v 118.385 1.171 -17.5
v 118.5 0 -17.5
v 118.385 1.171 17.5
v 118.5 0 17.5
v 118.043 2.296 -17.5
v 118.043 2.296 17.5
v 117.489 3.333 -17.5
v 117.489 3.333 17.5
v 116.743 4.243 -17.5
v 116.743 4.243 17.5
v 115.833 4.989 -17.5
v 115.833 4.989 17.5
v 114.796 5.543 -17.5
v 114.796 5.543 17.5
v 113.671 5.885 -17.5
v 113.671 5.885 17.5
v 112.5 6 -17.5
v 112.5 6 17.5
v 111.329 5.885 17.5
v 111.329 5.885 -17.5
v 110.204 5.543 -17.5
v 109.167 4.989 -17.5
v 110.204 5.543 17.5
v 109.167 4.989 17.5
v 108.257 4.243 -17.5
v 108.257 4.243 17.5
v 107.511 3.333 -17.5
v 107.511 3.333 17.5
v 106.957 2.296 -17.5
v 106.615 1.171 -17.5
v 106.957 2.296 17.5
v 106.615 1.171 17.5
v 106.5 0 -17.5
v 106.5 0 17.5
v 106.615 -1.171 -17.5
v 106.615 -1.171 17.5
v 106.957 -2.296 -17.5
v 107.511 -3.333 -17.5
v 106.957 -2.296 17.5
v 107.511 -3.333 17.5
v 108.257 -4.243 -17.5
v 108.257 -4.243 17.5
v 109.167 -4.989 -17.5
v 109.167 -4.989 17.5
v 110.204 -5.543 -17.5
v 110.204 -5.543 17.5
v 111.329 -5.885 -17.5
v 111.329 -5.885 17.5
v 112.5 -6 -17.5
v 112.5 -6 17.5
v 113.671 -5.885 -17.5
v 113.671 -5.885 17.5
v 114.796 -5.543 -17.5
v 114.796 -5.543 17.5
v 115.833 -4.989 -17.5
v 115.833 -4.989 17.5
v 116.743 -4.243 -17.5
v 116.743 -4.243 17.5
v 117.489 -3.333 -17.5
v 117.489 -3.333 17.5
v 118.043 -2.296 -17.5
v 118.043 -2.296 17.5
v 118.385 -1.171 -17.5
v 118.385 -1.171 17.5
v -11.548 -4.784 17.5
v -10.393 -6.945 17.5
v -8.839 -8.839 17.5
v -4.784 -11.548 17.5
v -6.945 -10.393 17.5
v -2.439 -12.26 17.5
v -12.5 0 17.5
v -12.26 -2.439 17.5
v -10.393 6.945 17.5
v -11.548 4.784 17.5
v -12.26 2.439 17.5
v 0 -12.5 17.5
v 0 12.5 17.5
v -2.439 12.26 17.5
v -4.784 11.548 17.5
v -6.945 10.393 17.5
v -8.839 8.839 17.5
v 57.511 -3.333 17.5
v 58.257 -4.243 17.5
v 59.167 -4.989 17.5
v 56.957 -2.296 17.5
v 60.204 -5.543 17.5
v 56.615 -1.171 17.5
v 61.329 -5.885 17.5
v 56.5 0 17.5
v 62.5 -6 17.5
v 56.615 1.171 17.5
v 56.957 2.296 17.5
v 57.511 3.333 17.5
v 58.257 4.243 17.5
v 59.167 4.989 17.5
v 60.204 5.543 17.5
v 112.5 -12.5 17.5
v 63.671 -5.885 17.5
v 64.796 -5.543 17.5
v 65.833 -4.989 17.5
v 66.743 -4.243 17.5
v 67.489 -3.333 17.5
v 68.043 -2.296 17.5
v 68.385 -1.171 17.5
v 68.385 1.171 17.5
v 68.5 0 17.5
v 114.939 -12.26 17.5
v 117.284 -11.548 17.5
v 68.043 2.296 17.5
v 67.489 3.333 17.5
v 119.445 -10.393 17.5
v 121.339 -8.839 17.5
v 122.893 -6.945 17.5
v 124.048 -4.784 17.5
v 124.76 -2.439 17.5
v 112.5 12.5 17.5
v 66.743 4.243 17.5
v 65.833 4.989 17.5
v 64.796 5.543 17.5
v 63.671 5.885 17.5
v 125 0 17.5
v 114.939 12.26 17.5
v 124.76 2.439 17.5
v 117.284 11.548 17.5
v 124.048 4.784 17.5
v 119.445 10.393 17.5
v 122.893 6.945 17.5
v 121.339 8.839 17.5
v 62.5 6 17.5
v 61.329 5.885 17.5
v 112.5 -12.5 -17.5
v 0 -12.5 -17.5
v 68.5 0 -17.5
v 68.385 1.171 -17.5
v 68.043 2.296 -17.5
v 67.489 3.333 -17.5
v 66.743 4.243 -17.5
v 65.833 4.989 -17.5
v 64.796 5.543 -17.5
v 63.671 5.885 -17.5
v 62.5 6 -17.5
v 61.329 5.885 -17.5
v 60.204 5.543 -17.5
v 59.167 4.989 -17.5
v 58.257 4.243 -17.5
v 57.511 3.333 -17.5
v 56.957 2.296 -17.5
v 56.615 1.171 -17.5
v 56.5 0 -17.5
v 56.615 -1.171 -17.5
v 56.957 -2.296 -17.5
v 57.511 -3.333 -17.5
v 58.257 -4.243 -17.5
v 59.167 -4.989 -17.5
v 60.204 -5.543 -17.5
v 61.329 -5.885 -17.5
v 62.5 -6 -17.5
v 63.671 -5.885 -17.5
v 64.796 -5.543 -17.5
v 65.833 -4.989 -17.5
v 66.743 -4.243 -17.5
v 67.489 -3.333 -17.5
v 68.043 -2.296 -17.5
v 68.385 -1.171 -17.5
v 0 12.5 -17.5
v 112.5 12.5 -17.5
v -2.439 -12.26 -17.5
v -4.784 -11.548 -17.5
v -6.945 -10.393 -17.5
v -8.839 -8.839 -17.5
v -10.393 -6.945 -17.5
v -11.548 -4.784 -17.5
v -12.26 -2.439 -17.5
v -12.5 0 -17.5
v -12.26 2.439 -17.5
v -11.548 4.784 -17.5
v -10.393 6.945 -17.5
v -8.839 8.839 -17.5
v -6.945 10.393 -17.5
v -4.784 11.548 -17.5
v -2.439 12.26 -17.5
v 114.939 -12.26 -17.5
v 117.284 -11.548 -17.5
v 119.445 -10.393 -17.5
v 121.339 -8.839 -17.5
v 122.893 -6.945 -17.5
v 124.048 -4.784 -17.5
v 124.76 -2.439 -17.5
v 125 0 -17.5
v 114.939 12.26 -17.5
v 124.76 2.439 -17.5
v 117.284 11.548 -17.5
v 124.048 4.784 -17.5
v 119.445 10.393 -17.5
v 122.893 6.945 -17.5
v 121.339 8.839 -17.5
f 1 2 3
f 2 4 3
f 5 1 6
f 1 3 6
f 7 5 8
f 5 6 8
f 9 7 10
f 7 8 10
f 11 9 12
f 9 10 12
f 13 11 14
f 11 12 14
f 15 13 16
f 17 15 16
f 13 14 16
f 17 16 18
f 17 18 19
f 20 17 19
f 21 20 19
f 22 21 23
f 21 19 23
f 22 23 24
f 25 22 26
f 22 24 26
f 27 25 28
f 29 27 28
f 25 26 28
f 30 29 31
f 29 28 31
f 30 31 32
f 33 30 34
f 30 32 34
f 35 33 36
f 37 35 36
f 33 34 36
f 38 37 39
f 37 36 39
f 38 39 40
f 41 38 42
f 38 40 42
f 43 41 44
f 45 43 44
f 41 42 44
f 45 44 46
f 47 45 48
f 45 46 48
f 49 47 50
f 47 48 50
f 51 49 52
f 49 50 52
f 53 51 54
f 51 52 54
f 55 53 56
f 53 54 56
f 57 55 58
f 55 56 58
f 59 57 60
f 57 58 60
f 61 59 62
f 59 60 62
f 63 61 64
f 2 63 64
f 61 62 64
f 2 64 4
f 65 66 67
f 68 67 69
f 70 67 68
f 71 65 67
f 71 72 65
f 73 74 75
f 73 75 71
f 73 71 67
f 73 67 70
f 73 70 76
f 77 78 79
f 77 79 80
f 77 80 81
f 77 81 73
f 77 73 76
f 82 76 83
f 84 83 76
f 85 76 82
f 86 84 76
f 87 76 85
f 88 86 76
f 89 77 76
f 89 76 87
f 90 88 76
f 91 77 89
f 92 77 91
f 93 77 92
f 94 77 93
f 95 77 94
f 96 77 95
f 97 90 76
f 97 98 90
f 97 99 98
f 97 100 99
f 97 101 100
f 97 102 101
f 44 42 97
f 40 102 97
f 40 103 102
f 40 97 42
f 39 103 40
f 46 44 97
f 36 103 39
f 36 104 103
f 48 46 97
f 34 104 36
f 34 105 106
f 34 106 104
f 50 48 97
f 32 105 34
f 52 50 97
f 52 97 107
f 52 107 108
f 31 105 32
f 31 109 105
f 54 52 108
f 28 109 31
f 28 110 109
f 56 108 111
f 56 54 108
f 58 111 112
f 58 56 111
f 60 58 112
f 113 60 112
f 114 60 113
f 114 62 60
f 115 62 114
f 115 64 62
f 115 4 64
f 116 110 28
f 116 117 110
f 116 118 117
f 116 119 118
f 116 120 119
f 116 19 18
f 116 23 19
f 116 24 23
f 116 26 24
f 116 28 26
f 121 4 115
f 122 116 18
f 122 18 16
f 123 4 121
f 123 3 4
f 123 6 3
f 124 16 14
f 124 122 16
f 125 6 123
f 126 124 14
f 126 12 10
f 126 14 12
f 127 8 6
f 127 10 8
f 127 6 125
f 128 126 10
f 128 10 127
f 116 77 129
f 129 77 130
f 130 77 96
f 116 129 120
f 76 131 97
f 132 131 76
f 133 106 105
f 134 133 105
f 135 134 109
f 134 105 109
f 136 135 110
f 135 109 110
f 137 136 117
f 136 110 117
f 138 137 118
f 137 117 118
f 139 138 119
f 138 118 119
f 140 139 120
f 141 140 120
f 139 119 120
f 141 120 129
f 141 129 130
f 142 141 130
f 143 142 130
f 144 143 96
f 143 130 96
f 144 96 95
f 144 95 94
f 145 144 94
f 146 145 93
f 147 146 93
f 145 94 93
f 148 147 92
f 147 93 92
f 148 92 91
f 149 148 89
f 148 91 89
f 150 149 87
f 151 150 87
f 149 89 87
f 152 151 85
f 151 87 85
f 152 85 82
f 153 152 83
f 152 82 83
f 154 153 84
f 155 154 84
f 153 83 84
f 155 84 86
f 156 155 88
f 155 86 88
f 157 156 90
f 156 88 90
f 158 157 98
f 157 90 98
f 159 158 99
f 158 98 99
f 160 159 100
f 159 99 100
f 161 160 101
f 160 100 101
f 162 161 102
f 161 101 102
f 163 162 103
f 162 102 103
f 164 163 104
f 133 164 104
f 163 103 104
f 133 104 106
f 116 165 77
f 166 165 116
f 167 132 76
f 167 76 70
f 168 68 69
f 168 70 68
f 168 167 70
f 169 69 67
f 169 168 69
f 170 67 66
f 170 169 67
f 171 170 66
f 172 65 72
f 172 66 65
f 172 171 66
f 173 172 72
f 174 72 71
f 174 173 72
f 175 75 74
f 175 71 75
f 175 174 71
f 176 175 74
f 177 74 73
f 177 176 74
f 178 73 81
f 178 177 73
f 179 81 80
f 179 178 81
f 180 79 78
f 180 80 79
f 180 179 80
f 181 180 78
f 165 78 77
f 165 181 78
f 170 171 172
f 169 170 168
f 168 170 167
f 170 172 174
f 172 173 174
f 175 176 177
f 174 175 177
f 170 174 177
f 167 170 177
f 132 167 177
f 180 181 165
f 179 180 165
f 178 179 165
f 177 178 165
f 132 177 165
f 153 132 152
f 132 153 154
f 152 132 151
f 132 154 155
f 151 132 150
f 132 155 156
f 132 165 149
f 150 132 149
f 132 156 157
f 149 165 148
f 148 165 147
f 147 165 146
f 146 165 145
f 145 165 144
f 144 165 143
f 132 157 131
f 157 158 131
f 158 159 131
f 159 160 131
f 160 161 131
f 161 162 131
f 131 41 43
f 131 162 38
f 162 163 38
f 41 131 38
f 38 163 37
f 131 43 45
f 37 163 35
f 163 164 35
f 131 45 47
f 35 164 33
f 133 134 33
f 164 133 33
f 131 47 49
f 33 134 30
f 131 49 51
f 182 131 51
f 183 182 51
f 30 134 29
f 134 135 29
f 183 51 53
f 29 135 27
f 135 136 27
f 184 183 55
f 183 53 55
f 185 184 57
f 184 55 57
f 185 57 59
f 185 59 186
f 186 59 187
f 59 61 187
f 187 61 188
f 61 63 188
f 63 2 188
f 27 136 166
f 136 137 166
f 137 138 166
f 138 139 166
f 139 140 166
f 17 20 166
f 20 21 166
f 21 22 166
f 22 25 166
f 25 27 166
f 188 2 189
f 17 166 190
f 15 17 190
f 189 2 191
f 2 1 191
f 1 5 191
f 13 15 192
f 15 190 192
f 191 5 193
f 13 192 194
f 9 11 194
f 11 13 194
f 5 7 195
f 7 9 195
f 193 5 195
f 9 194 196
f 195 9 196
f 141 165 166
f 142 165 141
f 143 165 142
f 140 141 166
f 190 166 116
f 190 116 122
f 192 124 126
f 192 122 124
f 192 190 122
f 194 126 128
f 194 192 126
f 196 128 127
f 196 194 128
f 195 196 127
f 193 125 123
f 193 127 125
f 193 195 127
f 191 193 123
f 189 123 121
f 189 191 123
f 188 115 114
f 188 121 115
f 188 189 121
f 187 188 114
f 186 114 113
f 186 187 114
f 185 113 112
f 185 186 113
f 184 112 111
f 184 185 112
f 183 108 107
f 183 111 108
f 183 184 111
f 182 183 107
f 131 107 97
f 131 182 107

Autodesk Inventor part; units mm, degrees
ref_plane "YZ Plane" through (0, 0, 0) normal (1, 0, 0) x (0, 1, 0)
ref_plane "XZ Plane" through (0, 0, 0) normal (0, 1, 0) x (-1, 0, 0)
ref_plane "XY Plane" through (0, 0, 0) normal (0, 0, 1) x (1, 0, 0)
sketch "Sketch1" plane through (0, 0, 0) normal (0, 0, 1) x (1, 0, 0)
  line L0 (0, 12.5) -> (112.5, 12.5)
  arc A0 (112.5, -12.5) -> (112.5, 12.5) centre (112.5, 0) ccw
  line L1 (112.5, -12.5) -> (0, -12.5)
  arc A1 (0, 12.5) -> (0, -12.5) centre (0, 0) ccw
  dimension "d0" = 25
  dimension "d2" = 112.5
extrude "Extrusion1" add sketch "Sketch1" along normal mid plane 35
sketch "Sketch2" plane through (0, 0, 17.5) normal (0, 0, 1) x (1, 0, 0)
  arc A0 (112.5, -12.5) -> (112.5, 12.5) centre (112.5, 0) ccw projected
  circle A1 centre (112.5, 0) radius 6
  circle A2 centre (62.5, 0) radius 6
  dimension "d5" = 12
  dimension "d7" = 50
extrude "Extrusion2" cut sketch "Sketch2" against normal through all
properties part number "ARM"
